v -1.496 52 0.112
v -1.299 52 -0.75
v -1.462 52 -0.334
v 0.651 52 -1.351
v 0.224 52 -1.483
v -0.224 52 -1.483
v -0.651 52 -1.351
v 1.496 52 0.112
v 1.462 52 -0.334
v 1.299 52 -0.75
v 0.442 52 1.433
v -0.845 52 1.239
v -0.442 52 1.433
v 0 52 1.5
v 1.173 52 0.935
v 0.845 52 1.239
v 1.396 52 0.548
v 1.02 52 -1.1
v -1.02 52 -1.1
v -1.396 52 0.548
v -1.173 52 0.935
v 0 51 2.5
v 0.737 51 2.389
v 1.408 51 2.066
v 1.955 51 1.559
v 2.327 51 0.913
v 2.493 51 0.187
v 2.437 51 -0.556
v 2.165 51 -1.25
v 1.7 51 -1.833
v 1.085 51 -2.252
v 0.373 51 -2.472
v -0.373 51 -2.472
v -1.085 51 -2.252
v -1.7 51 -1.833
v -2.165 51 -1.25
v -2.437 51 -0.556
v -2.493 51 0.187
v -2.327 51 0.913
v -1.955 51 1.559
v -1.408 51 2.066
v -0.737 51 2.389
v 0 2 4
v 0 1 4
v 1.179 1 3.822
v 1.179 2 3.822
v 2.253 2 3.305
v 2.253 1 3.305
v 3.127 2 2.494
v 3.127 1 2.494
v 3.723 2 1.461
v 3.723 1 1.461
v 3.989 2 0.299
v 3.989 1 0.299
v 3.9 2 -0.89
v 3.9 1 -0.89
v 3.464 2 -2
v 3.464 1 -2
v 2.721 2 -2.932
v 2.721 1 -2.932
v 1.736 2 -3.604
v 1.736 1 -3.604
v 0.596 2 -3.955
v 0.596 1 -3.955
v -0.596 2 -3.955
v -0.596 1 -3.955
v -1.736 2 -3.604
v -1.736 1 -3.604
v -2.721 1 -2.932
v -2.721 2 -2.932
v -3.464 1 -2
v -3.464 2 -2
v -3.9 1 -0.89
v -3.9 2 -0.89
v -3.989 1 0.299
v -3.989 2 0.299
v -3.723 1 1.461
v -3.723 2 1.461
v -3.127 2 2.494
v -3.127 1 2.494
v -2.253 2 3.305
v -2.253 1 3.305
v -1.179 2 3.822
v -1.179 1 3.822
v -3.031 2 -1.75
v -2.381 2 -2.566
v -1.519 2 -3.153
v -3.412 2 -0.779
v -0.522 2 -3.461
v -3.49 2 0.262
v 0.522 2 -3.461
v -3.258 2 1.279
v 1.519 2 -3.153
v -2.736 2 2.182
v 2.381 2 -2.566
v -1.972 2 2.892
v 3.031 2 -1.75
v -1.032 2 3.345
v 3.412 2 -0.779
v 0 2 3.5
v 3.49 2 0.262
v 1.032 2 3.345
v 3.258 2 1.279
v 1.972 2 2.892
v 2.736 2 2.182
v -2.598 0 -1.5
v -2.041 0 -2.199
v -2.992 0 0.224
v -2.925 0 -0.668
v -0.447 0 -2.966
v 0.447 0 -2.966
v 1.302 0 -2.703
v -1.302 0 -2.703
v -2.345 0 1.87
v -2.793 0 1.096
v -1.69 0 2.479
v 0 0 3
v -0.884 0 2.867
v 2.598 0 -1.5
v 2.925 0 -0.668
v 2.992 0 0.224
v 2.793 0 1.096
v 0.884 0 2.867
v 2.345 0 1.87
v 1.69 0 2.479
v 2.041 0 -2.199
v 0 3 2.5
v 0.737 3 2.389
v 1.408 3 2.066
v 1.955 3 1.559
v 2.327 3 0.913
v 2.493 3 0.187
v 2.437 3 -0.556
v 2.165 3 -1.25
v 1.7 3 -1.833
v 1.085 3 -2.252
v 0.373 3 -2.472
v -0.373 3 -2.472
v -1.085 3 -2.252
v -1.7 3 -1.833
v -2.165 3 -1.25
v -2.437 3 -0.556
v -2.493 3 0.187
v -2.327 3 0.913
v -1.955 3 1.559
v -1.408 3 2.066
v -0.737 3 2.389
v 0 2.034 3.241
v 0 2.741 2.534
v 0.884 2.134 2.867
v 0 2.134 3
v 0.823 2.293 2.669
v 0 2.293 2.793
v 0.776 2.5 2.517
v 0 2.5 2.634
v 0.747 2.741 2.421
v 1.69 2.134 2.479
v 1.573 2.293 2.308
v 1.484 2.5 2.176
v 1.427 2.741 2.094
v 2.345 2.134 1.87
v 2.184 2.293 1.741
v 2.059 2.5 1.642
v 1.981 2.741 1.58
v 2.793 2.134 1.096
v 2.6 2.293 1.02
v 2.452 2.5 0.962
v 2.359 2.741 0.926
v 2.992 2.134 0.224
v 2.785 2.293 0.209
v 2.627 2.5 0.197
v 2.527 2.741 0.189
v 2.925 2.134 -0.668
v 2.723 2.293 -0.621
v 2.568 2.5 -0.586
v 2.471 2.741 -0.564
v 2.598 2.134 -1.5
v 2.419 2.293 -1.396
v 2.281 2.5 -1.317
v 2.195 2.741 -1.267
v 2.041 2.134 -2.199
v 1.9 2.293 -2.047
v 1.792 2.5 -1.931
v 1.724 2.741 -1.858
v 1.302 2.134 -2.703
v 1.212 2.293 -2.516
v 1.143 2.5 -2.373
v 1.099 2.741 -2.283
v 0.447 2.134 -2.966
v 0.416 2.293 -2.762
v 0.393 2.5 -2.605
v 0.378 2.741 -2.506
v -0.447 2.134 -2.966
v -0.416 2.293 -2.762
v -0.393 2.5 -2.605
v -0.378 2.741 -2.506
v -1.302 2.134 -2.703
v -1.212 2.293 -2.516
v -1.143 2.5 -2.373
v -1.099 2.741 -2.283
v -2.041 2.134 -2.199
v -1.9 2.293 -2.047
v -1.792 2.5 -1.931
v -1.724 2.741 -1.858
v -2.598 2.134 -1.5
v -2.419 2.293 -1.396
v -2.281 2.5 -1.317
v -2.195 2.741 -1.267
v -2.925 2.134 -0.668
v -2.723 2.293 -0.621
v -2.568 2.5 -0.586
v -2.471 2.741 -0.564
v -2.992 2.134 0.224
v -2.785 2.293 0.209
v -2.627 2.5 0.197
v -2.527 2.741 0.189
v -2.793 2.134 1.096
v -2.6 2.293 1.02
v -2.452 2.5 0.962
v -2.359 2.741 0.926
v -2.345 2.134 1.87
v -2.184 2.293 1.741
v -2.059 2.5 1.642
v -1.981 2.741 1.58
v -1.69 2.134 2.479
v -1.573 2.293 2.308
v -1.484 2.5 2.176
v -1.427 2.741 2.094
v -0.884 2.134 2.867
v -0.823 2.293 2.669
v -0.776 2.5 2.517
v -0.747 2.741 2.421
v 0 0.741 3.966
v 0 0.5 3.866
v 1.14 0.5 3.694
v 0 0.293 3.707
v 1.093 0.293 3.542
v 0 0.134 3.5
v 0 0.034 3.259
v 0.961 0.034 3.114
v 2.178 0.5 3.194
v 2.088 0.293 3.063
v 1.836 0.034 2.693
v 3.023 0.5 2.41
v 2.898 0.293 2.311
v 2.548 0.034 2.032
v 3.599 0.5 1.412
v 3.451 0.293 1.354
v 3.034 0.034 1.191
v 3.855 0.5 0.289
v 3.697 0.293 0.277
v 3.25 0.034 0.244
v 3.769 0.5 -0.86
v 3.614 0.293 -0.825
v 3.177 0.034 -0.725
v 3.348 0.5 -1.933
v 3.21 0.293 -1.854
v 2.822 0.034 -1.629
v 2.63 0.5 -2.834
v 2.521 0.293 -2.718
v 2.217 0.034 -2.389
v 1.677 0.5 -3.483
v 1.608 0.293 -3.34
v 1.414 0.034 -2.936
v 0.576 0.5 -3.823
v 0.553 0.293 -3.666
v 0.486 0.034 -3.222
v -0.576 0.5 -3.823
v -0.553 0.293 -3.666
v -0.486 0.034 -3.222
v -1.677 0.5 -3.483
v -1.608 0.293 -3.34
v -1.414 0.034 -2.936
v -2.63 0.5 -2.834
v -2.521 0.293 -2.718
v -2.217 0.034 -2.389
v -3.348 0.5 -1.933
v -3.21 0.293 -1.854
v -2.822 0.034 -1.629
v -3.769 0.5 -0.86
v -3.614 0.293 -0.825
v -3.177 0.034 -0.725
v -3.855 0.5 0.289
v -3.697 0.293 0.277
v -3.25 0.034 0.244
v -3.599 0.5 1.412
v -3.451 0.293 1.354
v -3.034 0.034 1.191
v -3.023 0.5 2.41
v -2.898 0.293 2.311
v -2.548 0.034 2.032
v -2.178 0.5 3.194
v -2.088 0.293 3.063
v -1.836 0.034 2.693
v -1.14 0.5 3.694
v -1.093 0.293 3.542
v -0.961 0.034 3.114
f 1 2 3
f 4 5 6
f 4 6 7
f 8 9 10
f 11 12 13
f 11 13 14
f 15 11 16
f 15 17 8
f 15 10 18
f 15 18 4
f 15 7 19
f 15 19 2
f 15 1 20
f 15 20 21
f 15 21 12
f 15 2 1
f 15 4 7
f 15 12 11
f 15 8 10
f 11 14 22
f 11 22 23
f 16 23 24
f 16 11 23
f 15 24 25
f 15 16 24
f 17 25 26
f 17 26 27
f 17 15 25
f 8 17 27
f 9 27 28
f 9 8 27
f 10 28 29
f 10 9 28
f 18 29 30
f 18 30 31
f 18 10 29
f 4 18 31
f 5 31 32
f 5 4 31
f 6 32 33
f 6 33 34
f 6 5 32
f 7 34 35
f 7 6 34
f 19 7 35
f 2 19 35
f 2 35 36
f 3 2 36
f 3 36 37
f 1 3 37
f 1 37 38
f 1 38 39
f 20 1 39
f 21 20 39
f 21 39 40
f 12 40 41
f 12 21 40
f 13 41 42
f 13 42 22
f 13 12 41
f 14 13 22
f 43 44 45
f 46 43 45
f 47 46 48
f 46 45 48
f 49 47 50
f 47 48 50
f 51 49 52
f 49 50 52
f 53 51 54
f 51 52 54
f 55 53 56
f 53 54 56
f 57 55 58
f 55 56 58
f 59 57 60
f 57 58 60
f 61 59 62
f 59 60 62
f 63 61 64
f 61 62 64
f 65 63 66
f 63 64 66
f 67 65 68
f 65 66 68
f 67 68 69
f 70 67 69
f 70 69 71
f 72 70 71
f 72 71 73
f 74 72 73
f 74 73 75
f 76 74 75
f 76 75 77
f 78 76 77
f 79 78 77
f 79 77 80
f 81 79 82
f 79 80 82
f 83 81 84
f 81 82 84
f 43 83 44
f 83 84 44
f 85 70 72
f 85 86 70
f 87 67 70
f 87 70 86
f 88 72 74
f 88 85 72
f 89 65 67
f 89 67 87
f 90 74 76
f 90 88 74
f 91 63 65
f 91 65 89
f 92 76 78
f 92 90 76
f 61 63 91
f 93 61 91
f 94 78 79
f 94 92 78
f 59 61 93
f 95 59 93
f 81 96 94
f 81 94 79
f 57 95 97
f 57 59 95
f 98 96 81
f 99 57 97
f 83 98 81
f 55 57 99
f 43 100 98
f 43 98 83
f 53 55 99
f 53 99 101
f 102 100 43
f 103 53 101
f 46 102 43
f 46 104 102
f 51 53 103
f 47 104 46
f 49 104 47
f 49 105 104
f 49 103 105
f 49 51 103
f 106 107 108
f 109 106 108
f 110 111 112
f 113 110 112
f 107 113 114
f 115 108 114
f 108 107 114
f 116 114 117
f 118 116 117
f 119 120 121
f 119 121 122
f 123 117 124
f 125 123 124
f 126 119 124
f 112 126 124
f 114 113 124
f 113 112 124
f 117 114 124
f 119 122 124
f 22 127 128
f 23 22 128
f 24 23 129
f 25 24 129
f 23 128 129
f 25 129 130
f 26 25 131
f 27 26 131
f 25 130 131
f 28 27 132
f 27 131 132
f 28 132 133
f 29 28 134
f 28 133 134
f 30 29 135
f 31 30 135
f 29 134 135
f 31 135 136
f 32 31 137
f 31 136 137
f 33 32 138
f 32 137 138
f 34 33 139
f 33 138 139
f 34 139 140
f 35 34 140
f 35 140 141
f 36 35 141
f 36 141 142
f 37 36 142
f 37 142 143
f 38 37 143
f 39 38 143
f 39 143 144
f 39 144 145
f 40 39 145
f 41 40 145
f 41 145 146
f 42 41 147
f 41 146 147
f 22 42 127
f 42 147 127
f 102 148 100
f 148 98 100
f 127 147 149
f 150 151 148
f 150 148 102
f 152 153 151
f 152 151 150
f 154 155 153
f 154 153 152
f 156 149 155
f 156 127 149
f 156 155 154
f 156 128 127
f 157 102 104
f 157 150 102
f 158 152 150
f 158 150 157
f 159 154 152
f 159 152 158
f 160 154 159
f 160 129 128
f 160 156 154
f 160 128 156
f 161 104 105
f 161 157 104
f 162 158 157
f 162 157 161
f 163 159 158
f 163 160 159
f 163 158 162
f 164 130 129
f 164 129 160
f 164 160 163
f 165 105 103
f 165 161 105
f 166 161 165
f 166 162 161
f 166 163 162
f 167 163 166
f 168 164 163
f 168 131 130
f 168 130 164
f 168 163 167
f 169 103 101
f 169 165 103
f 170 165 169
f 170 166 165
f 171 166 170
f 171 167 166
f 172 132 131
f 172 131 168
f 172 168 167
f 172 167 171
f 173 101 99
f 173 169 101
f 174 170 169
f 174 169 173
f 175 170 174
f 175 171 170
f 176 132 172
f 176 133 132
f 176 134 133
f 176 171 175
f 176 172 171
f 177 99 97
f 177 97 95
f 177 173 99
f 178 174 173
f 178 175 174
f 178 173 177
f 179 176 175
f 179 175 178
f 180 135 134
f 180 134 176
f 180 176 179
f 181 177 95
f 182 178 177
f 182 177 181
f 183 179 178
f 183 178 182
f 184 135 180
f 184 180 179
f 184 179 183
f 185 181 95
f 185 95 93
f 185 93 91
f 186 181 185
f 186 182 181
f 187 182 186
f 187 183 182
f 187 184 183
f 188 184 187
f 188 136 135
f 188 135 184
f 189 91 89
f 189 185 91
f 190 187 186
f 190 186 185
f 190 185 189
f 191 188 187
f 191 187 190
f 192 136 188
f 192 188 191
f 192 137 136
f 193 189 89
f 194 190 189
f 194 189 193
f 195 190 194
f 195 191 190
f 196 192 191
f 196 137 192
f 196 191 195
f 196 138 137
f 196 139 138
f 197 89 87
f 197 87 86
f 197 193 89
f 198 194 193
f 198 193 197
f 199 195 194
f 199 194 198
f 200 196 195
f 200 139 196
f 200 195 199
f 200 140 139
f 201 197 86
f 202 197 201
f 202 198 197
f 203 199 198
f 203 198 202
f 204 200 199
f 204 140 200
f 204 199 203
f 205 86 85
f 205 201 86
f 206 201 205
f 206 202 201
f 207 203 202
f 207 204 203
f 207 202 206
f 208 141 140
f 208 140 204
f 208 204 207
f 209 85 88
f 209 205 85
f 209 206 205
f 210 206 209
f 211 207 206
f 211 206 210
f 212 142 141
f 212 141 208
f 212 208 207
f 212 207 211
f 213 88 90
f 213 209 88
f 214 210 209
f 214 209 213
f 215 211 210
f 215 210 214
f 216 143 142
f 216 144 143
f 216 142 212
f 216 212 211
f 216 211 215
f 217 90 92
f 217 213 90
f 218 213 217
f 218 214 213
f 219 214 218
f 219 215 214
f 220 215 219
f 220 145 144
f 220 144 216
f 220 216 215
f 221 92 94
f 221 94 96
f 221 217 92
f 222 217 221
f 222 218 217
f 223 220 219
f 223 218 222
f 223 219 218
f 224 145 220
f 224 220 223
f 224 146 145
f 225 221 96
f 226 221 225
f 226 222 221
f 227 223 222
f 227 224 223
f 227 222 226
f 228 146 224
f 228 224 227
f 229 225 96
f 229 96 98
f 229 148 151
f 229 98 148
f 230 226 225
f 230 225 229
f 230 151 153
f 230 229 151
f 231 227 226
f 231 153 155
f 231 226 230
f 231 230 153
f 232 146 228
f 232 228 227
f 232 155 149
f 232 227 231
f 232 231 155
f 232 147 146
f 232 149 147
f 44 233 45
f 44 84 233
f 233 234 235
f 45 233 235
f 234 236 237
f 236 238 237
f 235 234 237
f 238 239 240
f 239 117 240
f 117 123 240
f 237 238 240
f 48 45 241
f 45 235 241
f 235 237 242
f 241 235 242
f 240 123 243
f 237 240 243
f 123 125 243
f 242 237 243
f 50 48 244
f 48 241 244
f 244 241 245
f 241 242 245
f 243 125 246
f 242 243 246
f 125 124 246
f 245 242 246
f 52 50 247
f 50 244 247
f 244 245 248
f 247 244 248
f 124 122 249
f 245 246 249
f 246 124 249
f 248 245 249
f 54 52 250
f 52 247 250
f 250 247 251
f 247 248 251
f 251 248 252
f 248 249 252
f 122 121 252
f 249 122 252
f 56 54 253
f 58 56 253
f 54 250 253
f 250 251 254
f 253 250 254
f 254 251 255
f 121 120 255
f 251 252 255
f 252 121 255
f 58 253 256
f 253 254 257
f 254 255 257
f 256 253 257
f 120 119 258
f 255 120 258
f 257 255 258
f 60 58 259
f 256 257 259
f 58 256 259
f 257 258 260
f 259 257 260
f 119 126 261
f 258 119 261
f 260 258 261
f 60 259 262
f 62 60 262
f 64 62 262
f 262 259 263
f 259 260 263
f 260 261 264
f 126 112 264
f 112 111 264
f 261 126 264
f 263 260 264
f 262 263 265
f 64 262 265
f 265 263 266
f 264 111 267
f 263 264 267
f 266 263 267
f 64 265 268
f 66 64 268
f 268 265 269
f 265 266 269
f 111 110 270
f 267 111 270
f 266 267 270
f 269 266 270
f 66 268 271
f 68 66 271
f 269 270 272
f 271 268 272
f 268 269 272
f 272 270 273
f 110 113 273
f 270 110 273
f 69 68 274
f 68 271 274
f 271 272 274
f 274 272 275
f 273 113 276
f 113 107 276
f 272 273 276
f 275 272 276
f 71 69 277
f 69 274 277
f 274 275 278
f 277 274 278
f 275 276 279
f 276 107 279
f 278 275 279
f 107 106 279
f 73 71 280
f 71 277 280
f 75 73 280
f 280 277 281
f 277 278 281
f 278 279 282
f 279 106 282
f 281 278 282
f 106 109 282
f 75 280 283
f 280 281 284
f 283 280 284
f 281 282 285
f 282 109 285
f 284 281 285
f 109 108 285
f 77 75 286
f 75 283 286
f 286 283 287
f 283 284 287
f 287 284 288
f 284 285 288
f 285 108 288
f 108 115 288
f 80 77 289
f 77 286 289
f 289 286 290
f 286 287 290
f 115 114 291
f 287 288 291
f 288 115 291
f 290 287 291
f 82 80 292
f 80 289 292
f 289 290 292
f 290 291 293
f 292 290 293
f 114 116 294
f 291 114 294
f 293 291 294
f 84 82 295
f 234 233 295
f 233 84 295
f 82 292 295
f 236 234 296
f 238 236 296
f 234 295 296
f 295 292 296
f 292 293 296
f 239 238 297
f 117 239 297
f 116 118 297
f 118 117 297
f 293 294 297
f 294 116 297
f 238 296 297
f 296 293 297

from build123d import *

# Parameters (mm, degrees)
SKETCH1_R           = 4
BOSS_EXTRUDE1_DEPTH = 2
SKETCH2_R           = 2.5
BOSS_EXTRUDE2_DEPTH = 50
FILLET1_R           = 1
CHAMFER1_SIZE       = 1
FILLET2_R           = 1


with BuildPart() as part:
    # Sketch1 → Boss-Extrude1 (new body)
    with BuildSketch(Plane(origin=(0, 0, 0), x_dir=(1, 0, 0), z_dir=(0, 1, 0))):
        with Locations(Location((0, 0, 0), (0, 0, 270))):
            Circle(SKETCH1_R)
    extrude(amount=BOSS_EXTRUDE1_DEPTH)

    # Sketch2 → Boss-Extrude2 (add)
    with BuildSketch(Plane(origin=(0, 2, 0), x_dir=(1, 0, 0), z_dir=(0, 1, 0))):
        with Locations(Location((0, 0, 0), (0, 0, 270))):
            Circle(SKETCH2_R)
    extrude(amount=BOSS_EXTRUDE2_DEPTH)

    # Fillet1
    fillet1_edges = [part.edges().sort_by_distance(p)[0] for p in [
        (0, 2, -2.5),
    ]]
    fillet(fillet1_edges, radius=FILLET1_R)

    # Chamfer1
    chamfer1_edges = [part.edges().sort_by_distance(p)[0] for p in [
        (0, 52, -2.5),
    ]]
    chamfer(chamfer1_edges, length=CHAMFER1_SIZE)

    # Fillet2
    fillet2_edges = [part.edges().sort_by_distance(p)[0] for p in [
        (0, 0, -4),
    ]]
    fillet(fillet2_edges, radius=FILLET2_R)


solid = part.part
